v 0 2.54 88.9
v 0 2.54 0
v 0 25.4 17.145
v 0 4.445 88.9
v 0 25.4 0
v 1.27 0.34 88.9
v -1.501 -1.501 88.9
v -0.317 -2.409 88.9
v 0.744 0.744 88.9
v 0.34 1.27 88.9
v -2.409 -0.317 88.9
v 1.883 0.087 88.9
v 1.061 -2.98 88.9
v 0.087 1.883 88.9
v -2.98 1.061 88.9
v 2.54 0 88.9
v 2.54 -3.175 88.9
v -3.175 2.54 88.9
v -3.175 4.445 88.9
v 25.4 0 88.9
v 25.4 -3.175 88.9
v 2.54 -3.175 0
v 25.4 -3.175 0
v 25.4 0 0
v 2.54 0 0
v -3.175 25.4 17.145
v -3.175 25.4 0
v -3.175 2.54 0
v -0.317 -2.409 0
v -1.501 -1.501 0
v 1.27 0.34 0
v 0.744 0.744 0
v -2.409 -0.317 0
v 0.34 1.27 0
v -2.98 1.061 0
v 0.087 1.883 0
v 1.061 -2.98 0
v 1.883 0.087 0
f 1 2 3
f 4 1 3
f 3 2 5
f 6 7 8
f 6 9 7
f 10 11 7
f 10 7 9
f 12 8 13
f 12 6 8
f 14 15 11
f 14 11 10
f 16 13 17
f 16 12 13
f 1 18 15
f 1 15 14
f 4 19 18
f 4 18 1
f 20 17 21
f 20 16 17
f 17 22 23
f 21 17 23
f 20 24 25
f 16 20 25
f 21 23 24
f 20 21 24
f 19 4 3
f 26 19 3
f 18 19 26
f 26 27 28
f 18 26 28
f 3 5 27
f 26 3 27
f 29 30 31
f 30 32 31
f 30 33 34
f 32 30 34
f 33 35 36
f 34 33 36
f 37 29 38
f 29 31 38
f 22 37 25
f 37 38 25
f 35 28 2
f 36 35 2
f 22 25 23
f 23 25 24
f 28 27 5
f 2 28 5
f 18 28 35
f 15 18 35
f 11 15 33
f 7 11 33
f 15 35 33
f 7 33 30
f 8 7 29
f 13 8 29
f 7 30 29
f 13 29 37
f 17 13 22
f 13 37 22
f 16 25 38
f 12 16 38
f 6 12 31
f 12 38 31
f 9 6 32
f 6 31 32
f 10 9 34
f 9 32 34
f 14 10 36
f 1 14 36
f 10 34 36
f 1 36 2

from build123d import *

# Parameters (mm, degrees)
BASE_FLANGE1_DEPTH = 88.9
CUT_EXTRUDE1_DEPTH = 3.175


# Read off the part's stored shape, not the designer's step: Base-Flange1
with BuildPart() as part:
    # Base-Flange1 outline → Base-Flange1 (new body)
    with BuildSketch(Plane.XY):
        with BuildLine():
            Line((2.54, -3.175), (25.4, -3.175))
            Line((25.4, -3.175), (25.4, 0))
            Line((25.4, 0), (2.54, 0))
            ThreePointArc((2.54, 0), (0.743948776, 0.743948776), (0, 2.54))
            Line((0, 2.54), (0, 25.4))
            Line((0, 25.4), (-3.175, 25.4))
            Line((-3.175, 25.4), (-3.175, 2.54))
            ThreePointArc((-3.175, 2.54), (-1.501115254, -1.501115254), (2.54, -3.175))
        make_face()
    extrude(amount=BASE_FLANGE1_DEPTH)

    # Sketch2 → Cut-Extrude1 (cut)
    with BuildSketch(Plane(origin=(0, 0, 0), x_dir=(0, 0, -1), z_dir=(1, 0, 0))):
        Polygon((-88.9, 25.4), (-88.9, 4.445), (-17.145, 25.4), align=None)
    extrude(amount=-CUT_EXTRUDE1_DEPTH, mode=Mode.SUBTRACT)


solid = part.part
